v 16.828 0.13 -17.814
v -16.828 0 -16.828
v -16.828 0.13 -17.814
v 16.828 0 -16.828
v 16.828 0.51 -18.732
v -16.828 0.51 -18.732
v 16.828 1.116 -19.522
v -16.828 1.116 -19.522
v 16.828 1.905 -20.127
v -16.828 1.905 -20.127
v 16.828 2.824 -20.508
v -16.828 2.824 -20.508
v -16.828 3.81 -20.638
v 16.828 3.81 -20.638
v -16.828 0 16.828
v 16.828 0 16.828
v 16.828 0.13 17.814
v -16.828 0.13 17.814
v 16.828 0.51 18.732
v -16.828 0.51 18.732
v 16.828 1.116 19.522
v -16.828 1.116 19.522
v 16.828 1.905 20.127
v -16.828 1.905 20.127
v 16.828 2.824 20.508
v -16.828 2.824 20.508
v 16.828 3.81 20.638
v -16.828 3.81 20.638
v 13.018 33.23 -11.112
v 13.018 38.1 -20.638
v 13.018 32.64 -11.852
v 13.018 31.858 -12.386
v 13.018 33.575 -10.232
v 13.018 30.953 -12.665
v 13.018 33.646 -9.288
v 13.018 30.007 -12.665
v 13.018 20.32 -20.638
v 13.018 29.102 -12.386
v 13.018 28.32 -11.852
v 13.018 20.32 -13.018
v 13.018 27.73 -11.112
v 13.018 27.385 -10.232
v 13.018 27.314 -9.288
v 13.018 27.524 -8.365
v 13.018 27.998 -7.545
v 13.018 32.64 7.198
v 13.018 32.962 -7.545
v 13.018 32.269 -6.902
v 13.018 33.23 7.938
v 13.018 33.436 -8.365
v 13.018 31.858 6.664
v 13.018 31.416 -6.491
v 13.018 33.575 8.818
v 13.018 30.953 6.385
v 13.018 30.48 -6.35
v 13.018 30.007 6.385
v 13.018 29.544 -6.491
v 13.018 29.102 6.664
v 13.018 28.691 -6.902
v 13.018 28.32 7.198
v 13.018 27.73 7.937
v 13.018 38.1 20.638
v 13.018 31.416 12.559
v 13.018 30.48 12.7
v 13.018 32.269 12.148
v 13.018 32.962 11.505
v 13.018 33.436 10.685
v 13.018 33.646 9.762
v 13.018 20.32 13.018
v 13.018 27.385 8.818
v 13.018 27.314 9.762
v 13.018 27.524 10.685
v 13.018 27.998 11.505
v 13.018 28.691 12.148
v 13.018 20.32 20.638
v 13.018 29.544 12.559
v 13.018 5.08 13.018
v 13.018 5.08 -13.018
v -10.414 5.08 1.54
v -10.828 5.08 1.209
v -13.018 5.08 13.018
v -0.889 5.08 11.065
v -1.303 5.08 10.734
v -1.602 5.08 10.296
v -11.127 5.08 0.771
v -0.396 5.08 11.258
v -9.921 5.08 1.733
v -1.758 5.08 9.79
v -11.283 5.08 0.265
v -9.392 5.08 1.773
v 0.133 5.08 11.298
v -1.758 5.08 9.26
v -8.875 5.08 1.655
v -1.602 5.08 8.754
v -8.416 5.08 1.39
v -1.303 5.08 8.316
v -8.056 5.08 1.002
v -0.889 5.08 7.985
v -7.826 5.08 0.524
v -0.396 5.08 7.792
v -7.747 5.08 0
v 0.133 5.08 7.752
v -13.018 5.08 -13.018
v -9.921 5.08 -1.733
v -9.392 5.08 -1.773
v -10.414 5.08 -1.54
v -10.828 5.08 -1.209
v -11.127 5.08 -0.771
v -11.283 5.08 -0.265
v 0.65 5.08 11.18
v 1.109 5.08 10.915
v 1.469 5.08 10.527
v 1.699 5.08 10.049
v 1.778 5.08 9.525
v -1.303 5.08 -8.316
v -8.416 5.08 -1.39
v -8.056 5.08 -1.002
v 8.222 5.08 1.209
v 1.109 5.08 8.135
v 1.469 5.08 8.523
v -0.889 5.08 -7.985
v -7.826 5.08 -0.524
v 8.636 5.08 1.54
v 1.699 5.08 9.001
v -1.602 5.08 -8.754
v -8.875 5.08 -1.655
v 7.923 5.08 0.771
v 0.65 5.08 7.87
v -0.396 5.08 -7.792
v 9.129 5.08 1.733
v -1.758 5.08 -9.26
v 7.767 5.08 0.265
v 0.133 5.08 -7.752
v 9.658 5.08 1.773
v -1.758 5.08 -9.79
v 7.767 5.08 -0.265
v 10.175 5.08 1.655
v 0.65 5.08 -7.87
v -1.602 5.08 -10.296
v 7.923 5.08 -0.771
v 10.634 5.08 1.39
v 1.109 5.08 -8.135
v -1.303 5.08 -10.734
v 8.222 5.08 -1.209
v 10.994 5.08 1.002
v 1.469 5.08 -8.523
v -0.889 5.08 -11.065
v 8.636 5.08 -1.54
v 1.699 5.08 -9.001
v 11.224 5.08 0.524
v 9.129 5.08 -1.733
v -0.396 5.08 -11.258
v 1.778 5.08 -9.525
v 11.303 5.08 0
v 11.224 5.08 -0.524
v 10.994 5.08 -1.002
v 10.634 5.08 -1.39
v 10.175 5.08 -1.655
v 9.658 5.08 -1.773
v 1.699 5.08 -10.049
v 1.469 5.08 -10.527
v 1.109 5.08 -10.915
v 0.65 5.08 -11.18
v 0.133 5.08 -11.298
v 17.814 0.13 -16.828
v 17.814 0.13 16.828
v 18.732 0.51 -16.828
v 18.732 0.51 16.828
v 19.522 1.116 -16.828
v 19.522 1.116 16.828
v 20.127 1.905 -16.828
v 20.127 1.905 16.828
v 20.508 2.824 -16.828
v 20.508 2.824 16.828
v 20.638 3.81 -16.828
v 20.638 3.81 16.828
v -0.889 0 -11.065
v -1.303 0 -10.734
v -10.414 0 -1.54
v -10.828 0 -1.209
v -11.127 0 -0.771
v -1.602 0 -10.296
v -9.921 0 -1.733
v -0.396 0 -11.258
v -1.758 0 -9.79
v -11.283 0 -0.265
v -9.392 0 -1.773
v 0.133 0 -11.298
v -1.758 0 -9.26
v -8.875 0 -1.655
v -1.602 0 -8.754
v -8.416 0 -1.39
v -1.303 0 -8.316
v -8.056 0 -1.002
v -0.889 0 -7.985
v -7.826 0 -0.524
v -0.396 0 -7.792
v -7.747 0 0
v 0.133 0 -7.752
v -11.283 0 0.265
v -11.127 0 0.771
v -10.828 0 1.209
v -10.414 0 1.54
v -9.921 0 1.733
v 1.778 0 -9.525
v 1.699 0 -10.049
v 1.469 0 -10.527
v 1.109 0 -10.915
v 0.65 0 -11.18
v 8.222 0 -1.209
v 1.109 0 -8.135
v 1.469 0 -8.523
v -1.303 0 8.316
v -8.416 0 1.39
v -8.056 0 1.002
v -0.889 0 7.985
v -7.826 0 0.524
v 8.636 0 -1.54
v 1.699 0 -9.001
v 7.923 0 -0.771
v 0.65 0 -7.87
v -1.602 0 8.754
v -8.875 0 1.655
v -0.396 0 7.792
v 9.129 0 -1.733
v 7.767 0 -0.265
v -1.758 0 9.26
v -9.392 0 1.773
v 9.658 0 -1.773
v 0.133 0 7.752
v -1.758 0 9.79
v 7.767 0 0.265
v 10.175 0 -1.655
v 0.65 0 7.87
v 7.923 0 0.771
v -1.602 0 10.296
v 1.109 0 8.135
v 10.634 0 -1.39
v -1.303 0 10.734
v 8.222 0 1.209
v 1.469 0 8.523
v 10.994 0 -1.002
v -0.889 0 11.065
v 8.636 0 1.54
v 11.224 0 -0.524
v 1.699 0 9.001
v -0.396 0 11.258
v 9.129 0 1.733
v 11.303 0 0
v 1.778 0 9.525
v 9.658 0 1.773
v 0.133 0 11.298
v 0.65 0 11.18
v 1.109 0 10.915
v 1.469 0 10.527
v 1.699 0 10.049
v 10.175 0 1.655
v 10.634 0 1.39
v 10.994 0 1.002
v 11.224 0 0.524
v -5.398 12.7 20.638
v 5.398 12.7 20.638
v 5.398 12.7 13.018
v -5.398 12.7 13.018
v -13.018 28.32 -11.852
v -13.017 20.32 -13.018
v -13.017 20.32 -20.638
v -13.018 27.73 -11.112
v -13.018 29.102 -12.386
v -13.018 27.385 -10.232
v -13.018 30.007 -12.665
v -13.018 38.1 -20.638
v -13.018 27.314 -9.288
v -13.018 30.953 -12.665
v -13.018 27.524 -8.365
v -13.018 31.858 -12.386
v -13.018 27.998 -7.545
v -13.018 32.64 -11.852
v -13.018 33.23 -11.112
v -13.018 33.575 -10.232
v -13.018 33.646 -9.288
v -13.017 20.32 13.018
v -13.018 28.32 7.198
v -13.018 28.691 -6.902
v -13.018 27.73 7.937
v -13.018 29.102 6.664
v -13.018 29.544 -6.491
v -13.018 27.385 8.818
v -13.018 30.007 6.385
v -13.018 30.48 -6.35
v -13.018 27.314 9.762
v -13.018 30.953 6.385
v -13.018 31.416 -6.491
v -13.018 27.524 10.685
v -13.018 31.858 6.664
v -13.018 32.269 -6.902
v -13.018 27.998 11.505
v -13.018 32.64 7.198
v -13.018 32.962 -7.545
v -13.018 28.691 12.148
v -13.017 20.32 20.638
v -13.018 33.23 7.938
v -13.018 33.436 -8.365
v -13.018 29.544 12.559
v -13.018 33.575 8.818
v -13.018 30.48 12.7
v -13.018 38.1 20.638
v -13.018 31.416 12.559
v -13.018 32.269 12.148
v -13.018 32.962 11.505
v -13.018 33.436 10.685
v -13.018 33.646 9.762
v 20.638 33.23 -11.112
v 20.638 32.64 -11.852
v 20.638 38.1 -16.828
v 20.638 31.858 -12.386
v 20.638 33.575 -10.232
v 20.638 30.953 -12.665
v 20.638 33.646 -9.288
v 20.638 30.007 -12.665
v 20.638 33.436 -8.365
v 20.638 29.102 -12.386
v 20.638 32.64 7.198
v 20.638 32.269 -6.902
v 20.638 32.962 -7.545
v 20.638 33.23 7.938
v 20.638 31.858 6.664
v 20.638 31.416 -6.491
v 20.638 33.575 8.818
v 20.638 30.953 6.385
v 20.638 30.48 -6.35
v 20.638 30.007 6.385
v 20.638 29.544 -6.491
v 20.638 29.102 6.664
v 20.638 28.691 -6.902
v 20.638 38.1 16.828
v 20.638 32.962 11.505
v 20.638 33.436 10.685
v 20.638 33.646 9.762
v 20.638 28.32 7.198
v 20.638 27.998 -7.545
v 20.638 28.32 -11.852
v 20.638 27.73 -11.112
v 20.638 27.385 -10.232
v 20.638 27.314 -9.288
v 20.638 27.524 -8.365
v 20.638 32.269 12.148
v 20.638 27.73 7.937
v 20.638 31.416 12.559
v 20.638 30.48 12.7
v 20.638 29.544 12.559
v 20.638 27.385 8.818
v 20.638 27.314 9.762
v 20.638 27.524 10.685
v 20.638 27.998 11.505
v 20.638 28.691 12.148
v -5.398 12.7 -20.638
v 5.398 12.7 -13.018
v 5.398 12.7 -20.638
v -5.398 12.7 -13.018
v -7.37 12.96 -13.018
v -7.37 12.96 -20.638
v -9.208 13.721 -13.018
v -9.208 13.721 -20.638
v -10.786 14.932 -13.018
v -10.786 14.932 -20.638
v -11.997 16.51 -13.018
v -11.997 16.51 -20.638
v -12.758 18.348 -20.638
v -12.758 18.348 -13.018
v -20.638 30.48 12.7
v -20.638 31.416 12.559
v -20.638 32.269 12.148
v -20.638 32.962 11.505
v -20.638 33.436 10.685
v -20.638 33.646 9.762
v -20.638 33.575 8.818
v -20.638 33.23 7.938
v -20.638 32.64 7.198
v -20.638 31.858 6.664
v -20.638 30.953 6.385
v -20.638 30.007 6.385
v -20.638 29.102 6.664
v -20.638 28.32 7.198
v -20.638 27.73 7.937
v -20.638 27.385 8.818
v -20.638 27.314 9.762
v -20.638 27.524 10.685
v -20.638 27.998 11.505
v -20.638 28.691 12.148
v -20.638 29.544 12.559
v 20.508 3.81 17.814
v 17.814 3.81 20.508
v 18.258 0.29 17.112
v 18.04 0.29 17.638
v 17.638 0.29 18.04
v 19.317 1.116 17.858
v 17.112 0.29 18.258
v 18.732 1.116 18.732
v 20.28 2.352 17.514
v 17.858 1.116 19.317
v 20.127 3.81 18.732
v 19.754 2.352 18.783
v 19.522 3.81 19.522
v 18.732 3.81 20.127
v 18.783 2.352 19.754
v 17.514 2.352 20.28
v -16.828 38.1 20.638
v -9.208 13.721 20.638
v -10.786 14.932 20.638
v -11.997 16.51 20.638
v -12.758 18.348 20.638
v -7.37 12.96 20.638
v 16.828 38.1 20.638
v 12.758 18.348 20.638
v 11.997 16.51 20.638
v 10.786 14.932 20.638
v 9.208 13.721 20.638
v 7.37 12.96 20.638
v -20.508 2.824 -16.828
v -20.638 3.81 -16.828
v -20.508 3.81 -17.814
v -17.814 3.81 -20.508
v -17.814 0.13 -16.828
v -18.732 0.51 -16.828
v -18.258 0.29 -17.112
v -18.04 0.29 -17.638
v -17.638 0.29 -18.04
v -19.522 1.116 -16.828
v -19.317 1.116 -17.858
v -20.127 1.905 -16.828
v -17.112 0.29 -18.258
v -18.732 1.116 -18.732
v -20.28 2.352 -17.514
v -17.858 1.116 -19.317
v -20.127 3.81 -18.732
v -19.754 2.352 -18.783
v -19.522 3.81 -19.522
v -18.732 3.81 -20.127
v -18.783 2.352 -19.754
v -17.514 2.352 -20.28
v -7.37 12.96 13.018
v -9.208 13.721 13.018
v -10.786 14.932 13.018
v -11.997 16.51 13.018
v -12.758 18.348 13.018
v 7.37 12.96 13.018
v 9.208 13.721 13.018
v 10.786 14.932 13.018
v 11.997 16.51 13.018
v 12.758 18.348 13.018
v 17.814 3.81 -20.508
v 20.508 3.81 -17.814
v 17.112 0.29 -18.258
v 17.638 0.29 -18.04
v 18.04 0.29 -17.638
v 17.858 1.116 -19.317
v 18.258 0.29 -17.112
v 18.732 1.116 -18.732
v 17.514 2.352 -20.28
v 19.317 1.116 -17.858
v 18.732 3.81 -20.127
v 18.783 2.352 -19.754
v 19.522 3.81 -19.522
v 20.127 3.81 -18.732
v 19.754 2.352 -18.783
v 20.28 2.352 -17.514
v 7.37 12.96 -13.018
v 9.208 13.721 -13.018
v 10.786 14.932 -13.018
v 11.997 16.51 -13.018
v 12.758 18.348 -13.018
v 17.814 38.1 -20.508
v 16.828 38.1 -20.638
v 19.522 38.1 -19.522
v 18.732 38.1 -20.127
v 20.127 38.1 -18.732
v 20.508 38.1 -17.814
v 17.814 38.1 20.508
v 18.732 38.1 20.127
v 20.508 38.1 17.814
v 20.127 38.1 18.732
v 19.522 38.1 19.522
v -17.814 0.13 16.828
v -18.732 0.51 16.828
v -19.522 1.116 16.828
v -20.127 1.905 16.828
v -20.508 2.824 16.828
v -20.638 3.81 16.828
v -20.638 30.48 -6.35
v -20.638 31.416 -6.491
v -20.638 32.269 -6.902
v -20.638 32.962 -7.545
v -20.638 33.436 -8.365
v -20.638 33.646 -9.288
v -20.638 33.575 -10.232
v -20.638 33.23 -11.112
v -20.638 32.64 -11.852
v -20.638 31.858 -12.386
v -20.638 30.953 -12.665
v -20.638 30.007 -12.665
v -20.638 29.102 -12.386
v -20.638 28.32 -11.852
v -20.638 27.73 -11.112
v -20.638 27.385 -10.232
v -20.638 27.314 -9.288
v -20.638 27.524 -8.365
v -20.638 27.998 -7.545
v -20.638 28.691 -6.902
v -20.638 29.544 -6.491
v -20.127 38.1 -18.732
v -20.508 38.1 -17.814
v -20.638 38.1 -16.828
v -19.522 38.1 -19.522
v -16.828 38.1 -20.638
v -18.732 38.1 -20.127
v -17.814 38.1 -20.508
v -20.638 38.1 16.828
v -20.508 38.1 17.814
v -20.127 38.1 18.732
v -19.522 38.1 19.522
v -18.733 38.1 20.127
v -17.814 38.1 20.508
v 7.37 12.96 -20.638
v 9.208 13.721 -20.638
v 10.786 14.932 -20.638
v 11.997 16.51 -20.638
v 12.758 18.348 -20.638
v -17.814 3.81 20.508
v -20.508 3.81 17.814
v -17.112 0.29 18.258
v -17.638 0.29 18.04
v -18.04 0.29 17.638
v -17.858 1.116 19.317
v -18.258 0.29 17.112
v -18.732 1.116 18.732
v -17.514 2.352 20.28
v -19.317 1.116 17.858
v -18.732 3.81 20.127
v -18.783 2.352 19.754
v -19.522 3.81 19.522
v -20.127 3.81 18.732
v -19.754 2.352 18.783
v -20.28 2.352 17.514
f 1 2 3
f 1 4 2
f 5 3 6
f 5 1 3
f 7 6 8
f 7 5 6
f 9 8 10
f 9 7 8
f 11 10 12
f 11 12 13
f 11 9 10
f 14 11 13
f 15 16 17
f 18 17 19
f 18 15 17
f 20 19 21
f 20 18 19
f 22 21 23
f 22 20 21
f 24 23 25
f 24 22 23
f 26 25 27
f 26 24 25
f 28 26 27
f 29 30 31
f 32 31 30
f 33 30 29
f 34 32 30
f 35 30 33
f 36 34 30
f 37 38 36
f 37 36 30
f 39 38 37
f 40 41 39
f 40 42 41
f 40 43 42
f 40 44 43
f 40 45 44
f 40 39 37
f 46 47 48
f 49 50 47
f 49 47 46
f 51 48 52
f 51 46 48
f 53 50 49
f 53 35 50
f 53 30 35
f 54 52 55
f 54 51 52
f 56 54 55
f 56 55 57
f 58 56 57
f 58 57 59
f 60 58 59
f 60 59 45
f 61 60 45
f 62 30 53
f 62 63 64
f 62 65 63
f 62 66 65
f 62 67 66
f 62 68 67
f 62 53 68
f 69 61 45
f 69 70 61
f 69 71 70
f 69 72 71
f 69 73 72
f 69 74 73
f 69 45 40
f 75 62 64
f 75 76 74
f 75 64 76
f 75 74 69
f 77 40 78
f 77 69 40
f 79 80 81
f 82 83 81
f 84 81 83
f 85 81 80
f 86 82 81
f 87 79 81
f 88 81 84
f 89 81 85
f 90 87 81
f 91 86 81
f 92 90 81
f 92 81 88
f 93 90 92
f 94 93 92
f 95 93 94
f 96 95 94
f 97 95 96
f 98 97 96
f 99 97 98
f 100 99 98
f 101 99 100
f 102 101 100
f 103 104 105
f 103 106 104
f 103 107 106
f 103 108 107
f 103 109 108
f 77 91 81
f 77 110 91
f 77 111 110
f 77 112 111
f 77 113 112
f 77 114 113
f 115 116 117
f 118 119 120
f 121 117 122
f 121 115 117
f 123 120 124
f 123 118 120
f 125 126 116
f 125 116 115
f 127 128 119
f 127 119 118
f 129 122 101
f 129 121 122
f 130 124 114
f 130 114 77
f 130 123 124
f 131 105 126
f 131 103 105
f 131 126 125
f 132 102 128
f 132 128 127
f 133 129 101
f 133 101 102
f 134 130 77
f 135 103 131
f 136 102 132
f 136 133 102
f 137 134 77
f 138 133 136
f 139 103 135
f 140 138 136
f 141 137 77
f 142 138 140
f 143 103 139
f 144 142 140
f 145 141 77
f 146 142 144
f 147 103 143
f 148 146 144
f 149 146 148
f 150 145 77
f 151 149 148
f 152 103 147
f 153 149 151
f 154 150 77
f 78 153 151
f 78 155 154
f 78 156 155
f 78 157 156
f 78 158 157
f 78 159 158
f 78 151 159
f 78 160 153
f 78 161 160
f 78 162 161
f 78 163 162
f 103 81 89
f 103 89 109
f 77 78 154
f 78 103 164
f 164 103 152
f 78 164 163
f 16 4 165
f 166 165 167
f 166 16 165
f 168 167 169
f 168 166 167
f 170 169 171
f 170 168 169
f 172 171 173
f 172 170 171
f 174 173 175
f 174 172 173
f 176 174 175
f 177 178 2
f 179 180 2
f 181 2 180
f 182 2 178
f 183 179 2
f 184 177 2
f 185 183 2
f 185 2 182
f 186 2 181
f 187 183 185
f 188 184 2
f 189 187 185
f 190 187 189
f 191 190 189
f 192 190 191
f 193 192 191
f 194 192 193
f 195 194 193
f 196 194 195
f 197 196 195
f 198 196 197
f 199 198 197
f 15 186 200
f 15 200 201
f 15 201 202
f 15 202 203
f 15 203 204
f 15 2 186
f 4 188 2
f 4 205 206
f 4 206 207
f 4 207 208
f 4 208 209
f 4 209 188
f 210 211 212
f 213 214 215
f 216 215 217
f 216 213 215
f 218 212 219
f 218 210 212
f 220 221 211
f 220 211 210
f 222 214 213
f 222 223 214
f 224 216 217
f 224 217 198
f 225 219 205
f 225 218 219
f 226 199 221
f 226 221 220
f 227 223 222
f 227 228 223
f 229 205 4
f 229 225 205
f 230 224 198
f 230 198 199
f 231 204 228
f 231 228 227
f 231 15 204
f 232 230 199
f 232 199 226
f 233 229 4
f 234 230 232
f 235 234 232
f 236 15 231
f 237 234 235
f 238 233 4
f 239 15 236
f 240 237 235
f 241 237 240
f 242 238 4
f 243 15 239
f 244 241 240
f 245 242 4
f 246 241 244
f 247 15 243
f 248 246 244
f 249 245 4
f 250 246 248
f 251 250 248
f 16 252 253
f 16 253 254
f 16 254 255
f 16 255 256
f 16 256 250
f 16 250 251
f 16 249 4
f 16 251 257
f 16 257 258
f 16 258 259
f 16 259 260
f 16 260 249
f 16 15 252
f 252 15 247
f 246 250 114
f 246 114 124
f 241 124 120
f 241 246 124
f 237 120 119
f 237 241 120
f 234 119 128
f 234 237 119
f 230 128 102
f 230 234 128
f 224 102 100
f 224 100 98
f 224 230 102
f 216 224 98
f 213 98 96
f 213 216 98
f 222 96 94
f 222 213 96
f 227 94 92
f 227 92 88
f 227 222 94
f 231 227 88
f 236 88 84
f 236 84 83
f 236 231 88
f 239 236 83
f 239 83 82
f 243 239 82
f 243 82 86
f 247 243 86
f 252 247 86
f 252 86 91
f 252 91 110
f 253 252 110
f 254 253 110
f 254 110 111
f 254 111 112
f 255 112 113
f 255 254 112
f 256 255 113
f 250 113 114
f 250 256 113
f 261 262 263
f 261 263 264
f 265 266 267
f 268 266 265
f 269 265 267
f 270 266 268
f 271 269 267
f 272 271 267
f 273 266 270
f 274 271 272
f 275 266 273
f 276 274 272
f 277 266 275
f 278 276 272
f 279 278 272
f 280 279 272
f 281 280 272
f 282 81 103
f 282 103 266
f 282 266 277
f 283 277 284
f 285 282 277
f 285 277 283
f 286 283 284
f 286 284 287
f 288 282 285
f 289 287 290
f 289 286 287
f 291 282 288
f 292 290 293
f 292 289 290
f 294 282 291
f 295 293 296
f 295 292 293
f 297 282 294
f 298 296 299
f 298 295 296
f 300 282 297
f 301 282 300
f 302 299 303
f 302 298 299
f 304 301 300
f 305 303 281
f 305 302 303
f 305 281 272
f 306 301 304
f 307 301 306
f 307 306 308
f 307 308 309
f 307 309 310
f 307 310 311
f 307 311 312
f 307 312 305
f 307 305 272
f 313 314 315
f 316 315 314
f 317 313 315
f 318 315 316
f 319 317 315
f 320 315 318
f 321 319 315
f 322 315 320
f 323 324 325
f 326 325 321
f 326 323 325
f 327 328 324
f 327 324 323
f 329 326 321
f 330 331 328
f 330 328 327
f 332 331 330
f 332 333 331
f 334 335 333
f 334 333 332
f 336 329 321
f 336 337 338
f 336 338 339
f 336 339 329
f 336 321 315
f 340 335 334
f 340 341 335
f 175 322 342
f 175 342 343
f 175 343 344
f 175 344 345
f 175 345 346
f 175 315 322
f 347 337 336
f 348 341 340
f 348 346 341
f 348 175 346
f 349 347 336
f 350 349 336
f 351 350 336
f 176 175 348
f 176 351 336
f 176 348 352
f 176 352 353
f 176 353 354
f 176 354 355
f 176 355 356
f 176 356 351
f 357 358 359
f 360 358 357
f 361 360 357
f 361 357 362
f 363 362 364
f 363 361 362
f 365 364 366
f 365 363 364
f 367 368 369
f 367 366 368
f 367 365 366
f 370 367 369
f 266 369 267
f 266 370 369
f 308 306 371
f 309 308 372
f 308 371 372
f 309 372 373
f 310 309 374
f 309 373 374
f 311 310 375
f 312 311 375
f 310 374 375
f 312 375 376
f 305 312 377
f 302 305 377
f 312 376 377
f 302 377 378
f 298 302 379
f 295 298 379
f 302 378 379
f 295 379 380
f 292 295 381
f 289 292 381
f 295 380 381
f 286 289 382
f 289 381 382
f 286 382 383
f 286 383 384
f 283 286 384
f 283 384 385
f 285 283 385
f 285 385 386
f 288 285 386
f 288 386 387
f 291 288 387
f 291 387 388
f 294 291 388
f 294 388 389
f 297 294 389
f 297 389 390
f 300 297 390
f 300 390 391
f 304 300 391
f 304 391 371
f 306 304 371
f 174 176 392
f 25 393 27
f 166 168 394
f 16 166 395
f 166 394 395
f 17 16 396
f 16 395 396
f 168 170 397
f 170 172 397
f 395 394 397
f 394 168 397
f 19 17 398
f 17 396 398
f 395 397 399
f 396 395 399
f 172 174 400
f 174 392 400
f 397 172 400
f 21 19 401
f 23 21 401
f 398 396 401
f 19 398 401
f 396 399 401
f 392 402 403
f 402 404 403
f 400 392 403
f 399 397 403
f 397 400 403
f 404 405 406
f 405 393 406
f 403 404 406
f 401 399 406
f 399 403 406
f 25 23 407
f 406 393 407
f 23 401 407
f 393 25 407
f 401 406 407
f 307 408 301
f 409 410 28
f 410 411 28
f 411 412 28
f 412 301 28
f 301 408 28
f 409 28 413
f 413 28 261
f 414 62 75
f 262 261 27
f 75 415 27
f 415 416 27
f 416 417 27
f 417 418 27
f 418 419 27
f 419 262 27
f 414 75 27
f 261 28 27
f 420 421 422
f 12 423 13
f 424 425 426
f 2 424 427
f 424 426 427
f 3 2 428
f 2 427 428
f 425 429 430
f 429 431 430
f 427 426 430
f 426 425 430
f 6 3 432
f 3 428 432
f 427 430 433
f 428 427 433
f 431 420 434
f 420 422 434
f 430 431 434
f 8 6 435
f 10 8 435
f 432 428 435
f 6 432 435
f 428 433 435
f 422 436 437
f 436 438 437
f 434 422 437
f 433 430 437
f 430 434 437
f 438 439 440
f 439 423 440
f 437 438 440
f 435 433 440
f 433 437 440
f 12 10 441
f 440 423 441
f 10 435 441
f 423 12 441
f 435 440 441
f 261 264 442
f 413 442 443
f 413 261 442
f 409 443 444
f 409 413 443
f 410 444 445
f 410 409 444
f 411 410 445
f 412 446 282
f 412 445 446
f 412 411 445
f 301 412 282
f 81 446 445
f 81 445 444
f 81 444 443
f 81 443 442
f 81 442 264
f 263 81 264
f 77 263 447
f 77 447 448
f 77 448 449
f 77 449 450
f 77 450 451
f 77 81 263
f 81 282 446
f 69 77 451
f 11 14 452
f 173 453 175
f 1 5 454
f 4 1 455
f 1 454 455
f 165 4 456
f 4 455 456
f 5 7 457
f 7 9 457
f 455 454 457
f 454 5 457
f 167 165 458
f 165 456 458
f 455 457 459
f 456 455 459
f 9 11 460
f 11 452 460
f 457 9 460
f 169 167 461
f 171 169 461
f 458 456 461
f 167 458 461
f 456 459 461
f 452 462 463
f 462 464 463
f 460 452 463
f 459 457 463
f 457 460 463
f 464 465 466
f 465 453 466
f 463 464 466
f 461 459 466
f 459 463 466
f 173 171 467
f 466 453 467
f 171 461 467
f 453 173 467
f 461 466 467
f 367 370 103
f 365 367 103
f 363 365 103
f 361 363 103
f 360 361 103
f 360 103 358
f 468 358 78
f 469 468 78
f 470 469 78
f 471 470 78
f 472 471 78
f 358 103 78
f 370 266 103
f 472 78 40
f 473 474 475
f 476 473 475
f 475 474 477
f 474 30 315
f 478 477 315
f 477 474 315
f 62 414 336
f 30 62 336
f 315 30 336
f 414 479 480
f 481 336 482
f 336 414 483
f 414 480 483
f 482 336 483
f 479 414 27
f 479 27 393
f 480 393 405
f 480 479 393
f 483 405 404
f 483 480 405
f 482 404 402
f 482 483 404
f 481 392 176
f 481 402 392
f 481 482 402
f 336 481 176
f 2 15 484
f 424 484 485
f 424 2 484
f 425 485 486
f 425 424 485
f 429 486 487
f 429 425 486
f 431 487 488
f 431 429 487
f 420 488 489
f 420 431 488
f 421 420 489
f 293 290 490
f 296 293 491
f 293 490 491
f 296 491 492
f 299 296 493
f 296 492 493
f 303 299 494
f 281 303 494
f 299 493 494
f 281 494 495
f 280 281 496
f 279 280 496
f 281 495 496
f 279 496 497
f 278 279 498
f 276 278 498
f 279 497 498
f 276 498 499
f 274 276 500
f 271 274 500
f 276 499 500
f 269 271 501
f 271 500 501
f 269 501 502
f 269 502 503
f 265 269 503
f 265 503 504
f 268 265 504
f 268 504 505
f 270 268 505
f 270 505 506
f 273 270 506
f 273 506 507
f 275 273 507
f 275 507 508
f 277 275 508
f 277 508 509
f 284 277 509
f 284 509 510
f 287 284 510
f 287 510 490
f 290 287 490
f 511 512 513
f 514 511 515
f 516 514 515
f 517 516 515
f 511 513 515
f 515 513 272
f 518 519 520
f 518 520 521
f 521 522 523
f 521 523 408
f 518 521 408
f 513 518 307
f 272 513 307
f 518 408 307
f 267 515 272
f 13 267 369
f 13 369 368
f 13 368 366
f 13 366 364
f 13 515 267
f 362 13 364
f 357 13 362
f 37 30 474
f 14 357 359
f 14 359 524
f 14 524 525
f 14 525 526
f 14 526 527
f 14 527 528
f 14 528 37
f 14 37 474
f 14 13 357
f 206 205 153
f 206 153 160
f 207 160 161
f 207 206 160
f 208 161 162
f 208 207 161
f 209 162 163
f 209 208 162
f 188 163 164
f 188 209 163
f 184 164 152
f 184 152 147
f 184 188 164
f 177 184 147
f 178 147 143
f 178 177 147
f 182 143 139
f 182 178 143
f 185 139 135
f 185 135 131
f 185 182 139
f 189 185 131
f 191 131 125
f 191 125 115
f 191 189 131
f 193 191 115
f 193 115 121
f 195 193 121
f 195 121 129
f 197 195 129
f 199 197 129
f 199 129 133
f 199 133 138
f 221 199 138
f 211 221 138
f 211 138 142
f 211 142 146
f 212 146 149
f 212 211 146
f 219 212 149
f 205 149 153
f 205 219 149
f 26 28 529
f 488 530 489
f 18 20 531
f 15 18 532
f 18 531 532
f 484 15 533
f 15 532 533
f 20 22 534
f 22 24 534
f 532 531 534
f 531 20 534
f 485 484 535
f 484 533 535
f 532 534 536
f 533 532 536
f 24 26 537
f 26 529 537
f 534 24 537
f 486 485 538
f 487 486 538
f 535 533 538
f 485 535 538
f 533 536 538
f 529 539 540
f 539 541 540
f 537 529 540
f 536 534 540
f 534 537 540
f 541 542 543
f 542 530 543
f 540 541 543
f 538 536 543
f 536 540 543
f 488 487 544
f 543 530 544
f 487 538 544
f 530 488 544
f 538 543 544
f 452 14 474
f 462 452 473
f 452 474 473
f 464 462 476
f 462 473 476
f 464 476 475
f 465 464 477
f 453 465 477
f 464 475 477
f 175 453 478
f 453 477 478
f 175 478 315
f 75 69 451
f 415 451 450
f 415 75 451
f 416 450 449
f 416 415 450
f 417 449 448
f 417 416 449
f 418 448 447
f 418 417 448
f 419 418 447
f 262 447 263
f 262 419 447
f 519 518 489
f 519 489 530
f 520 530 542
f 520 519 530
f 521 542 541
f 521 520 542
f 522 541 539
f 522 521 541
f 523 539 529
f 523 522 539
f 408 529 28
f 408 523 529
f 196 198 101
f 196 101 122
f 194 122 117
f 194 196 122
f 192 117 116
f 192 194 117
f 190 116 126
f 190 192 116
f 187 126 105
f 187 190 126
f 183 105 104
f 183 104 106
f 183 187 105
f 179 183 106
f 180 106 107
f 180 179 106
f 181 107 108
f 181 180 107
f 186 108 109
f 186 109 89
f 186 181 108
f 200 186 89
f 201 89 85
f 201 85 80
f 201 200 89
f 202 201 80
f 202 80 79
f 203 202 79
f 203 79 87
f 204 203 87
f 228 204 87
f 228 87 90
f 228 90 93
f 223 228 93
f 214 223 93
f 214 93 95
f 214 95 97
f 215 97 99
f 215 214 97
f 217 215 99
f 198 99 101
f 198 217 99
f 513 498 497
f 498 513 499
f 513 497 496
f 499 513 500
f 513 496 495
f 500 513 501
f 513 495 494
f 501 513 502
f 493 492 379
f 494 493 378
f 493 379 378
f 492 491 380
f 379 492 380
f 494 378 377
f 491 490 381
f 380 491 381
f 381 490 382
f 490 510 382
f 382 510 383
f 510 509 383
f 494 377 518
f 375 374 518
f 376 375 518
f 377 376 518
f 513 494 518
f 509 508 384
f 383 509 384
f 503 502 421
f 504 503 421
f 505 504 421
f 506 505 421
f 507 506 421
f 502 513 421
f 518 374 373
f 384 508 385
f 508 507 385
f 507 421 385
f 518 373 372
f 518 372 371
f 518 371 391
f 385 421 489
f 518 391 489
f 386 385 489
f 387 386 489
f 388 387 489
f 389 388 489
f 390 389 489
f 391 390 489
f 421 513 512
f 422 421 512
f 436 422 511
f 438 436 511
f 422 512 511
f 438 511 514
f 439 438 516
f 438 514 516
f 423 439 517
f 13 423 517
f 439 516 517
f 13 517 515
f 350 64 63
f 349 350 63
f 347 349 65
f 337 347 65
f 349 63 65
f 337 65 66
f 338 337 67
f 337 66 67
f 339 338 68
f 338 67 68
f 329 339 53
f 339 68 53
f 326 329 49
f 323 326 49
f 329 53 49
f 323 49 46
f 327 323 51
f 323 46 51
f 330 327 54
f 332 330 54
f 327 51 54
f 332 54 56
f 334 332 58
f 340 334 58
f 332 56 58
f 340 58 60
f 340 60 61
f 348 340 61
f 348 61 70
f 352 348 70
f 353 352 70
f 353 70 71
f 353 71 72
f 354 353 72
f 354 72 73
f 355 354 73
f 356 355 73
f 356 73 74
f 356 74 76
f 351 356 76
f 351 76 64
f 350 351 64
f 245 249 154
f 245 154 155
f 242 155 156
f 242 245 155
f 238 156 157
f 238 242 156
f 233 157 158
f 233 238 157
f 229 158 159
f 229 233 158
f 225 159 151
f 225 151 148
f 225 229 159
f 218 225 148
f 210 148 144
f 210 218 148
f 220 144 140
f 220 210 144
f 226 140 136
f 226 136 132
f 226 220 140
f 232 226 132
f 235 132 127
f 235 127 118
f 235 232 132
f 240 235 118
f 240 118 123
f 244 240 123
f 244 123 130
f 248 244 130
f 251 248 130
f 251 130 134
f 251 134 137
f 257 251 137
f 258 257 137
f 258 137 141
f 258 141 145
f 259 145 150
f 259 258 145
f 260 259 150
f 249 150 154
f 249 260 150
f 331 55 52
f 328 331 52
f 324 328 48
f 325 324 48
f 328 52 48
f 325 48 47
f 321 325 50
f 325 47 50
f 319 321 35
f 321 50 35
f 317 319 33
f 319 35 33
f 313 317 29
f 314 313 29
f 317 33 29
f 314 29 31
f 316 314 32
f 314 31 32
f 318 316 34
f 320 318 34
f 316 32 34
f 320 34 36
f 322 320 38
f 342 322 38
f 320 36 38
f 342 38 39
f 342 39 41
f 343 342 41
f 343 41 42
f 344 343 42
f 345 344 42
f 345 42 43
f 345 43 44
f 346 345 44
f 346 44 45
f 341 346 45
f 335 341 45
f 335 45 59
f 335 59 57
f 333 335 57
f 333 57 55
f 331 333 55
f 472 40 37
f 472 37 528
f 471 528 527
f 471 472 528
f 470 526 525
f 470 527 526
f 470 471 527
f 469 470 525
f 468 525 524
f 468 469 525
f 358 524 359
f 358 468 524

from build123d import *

# Parameters (mm, degrees)
SKETCH1_W           = 26.035
SKETCH1_H           = 26.035
SKETCH1_R           = 1.778
BOSS_EXTRUDE1_DEPTH = 5.08
SKETCH9_W           = 41.275
SKETCH9_H           = 41.275
SKETCH9_W_2         = 26.035
SKETCH9_H_2         = 26.035
BOSS_EXTRUDE7_DEPTH = 38.1
CUT_EXTRUDE4_DEPTH  = 42.275
SKETCH11_R          = 3.175
CUT_EXTRUDE5_DEPTH  = 42.275
FILLET1_R           = 3.81
FILLET2_R           = 3.81


with BuildPart() as part:
    # Sketch1 → Boss-Extrude1 (new body)
    with BuildSketch(Plane(origin=(0, 0, 0), x_dir=(1, 0, 0), z_dir=(0, 1, 0))):
        Rectangle(SKETCH1_W, SKETCH1_H)
        with Locations((0, 9.525)):
            Circle(SKETCH1_R, mode=Mode.SUBTRACT)
        with Locations((-9.525, 0)):
            Circle(SKETCH1_R, mode=Mode.SUBTRACT)
        with Locations((9.525, 0)):
            Circle(SKETCH1_R, mode=Mode.SUBTRACT)
        with Locations((0, -9.525)):
            Circle(SKETCH1_R, mode=Mode.SUBTRACT)
    extrude(amount=BOSS_EXTRUDE1_DEPTH)

    # Sketch9 → Boss-Extrude7 (add)
    with BuildSketch(Plane.XZ):
        Rectangle(SKETCH9_W, SKETCH9_H)
        Rectangle(SKETCH9_W_2, SKETCH9_H_2, mode=Mode.SUBTRACT)
    extrude(amount=-BOSS_EXTRUDE7_DEPTH)

    # Sketch10 → Cut-Extrude4 (cut, through all)
    with BuildSketch(Plane.XY.offset(20.6375)):
        with BuildLine():
            Line((-13.0175, 20.32), (-13.0175, 38.1))
            Line((-13.0175, 38.1), (13.0175, 38.1))
            Line((13.0175, 38.1), (13.0175, 20.32))
            ThreePointArc((13.0175, 20.32), (10.785653673, 14.931846327), (5.3975, 12.7))
            Line((5.3975, 12.7), (-5.3975, 12.7))
            ThreePointArc((-5.3975, 12.7), (-10.785653673, 14.931846327), (-13.0175, 20.32))
        make_face()
    extrude(amount=-CUT_EXTRUDE4_DEPTH, mode=Mode.SUBTRACT)

    # Sketch11 → Cut-Extrude5 (cut, through all)
    with BuildSketch(Plane.ZY.offset(20.6375)):
        with Locations((-9.525, 30.48)):
            Circle(SKETCH11_R)
        with Locations((9.525, 30.48)):
            Circle(SKETCH11_R)
    extrude(amount=-CUT_EXTRUDE5_DEPTH, mode=Mode.SUBTRACT)

    # Fillet1
    fillet1_edges = [part.edges().sort_by_distance(p)[0] for p in [
        (20.6375, 19.05, -20.6375),
        (-20.6375, 19.05, -20.6375),
        (-20.6375, 19.05, 20.6375),
        (20.6375, 19.05, 20.6375),
    ]]
    fillet(fillet1_edges, radius=FILLET1_R)

    # Fillet2
    fillet2_edges = [part.edges().sort_by_distance(p)[0] for p in [
        (0, 0, -20.6375),
        (20.6375, 0, 0),
        (0, 0, 20.6375),
        (-20.6375, 0, 0),
        (-19.521576836, 0, 19.521576836),
        (-19.521576836, 0, -19.521576836),
        (19.521576836, 0, 19.521576836),
        (19.521576836, 0, -19.521576836),
    ]]
    fillet(fillet2_edges, radius=FILLET2_R)


solid = part.part
